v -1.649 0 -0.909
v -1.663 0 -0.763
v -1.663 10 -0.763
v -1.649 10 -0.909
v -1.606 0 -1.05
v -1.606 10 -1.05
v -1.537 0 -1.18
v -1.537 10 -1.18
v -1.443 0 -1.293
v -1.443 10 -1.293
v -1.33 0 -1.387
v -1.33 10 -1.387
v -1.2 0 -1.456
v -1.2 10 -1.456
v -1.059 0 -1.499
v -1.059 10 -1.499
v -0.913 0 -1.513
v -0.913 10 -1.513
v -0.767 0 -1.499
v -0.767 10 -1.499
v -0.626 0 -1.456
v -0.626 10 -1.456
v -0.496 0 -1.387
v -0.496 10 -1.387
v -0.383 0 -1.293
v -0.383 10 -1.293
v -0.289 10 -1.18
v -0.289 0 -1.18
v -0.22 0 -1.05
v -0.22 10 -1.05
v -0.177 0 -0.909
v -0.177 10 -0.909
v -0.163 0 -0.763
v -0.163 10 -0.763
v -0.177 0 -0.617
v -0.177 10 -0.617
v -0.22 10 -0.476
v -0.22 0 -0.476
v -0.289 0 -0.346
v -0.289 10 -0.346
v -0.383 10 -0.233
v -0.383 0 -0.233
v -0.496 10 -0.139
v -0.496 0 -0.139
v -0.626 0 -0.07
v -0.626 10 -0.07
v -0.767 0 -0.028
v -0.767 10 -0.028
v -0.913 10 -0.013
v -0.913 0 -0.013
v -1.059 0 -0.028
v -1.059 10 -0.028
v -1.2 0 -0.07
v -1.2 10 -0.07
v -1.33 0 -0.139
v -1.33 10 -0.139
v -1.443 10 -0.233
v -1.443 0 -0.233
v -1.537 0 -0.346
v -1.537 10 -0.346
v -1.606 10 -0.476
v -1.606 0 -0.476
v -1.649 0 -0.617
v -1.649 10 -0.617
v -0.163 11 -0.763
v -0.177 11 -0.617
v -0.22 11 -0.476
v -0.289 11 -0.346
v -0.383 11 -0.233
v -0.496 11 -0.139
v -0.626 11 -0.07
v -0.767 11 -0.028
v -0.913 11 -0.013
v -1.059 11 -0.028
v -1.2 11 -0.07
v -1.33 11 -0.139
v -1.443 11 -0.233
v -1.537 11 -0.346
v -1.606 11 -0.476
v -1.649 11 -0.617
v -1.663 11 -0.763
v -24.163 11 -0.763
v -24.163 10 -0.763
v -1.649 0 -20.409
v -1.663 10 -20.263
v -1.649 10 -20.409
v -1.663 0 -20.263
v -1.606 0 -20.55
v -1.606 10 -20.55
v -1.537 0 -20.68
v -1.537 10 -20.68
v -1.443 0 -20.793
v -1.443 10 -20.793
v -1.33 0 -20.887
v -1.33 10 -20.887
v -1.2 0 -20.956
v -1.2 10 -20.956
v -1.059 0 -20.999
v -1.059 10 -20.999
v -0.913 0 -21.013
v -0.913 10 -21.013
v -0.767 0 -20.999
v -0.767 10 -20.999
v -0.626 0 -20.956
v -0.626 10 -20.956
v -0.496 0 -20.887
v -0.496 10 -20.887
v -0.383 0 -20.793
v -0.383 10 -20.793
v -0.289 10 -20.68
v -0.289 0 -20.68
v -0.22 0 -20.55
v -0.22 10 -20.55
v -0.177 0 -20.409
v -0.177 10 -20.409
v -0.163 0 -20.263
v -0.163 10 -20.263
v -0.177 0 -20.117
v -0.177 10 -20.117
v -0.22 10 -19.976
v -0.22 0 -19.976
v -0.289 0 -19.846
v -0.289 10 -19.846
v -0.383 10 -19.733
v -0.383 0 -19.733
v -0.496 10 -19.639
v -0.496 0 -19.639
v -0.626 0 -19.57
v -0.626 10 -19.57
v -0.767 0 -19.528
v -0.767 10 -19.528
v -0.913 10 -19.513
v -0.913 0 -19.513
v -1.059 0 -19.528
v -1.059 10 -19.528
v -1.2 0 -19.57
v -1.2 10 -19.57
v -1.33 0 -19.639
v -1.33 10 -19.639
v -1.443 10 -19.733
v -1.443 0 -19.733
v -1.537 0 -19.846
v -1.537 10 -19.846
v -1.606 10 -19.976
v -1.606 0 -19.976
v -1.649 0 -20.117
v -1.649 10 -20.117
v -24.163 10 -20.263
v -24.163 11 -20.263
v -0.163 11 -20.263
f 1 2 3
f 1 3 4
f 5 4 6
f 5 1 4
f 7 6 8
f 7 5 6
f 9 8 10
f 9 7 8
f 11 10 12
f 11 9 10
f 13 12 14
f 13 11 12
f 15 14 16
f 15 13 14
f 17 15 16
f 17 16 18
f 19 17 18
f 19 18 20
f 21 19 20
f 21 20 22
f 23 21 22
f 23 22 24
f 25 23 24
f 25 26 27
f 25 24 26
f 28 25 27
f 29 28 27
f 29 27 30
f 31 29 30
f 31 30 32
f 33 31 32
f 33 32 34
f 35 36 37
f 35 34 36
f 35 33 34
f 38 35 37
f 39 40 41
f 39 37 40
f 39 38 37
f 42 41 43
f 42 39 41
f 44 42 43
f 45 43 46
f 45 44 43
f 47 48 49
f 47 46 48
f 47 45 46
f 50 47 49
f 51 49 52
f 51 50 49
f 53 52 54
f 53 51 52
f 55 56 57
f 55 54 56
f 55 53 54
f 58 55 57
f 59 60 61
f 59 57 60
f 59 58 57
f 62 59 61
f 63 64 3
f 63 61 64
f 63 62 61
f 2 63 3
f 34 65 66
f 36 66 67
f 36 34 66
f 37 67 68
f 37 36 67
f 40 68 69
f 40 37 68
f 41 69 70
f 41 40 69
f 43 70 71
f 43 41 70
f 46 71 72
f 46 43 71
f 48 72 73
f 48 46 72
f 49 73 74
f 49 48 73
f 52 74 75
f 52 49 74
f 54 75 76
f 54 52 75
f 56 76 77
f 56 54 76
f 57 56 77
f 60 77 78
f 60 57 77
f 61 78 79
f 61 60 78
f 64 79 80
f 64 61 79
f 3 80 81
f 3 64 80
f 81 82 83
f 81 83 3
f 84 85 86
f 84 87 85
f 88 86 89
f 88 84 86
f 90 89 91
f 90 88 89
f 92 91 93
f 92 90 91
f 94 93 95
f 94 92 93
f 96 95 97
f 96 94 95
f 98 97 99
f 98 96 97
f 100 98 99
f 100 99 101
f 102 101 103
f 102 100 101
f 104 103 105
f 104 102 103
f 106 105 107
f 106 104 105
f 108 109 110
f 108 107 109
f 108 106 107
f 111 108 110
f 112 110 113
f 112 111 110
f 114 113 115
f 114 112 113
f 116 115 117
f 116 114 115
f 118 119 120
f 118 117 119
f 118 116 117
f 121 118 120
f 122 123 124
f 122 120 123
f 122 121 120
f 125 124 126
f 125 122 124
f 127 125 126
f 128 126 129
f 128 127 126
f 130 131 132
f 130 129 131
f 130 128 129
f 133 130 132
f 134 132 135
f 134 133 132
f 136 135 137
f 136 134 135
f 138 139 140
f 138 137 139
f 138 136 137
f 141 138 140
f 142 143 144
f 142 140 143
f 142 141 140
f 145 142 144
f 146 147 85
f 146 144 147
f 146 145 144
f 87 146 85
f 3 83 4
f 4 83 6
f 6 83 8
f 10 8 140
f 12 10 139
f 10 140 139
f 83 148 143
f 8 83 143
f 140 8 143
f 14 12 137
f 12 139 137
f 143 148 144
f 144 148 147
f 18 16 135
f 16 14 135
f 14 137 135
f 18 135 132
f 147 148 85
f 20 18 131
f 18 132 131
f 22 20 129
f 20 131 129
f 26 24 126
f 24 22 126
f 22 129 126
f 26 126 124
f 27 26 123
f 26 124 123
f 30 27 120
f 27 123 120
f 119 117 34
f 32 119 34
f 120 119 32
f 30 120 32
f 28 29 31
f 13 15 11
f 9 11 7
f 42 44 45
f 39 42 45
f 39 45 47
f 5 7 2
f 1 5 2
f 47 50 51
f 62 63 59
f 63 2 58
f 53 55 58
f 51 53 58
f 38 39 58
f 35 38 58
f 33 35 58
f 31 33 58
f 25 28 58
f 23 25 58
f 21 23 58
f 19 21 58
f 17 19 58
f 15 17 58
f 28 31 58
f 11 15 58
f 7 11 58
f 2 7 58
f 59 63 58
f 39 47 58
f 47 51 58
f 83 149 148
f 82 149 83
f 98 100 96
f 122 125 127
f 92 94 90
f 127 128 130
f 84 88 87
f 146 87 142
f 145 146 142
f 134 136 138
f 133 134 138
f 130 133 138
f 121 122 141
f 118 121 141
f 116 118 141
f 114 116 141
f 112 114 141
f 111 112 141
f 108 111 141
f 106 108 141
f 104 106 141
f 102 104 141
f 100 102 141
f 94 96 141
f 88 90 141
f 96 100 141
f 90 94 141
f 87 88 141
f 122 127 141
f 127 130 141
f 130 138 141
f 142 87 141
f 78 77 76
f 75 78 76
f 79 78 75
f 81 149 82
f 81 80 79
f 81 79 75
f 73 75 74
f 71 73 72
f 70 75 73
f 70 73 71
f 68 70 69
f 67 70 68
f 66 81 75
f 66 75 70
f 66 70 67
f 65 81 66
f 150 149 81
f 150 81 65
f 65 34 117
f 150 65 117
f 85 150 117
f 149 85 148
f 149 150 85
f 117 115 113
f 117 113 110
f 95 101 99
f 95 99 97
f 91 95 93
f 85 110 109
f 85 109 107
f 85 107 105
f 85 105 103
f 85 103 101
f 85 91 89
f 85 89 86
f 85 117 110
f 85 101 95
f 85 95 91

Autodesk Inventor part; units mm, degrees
ref_plane "YZ Plane" through (0, 0, 0) normal (1, 0, 0) x (0, 1, 0)
ref_plane "XZ Plane" through (0, 0, 0) normal (0, 1, 0) x (-1, 0, 0)
ref_plane "XY Plane" through (0, 0, 0) normal (0, 0, 1) x (1, 0, 0)
sketch "草圖1" plane through (0, 0, 0) normal (0, 1, 0) x (-1, 0, 0)
  circle A0 centre (0.913, -0.7631) radius 0.75
  point P0 (0, 0)
  dimension "d0" = 1.5
extrude "擠出1" add sketch "草圖1" along normal blind 10
sketch "草圖2" plane through (-0.913, 10, -0.7631) normal (0, 1, 0) x (1, 0, 0)
  circle A0 centre (0, 0) radius 0.75 projected
  line L0 (-0.75, 0) -> (0.75, 0)
  line L1 (0.75, 0) -> (0.75, 19.5)
  line L2 (0.75, 19.5) -> (-0.75, 19.5)
  line L3 (-0.75, 19.5) -> (-0.75, 0)
  circle A1 centre (0, 0) radius 0.75 projected
  point P0 (0.913, -0.7631)
  dimension "d3" = 19.5
extrude "擠出2" add sketch "草圖2" along normal blind 1
pattern_linear "矩形陣列1" count 2 spacing 19.5 along (0, 0, -1) of "擠出1"
sketch "草圖3" plane through (-0.913, 11, -0.7631) normal (0, 1, 0) x (1, 0, 0)
  circle A0 centre (0, 19.5) radius 0.75 projected
  line L0 (-0.75, 19.5) -> (-23.25, 19.5)
  line L1 (-23.25, 19.5) -> (-23.25, 0)
  line L2 (-23.25, 0) -> (-0.75, 0)
  line L3 (-0.75, 0) -> (-0.75, 19.5)
  line L4 (0.75, 0) -> (0.75, 19.5) projected
  point P0 (0.913, -0.7631)
  point P1 (-0.75, 0)
  dimension "d9" = 24
extrude "擠出3" add sketch "草圖3" against normal up to surface (1 mm away) contours L3 L2 L1 L0
